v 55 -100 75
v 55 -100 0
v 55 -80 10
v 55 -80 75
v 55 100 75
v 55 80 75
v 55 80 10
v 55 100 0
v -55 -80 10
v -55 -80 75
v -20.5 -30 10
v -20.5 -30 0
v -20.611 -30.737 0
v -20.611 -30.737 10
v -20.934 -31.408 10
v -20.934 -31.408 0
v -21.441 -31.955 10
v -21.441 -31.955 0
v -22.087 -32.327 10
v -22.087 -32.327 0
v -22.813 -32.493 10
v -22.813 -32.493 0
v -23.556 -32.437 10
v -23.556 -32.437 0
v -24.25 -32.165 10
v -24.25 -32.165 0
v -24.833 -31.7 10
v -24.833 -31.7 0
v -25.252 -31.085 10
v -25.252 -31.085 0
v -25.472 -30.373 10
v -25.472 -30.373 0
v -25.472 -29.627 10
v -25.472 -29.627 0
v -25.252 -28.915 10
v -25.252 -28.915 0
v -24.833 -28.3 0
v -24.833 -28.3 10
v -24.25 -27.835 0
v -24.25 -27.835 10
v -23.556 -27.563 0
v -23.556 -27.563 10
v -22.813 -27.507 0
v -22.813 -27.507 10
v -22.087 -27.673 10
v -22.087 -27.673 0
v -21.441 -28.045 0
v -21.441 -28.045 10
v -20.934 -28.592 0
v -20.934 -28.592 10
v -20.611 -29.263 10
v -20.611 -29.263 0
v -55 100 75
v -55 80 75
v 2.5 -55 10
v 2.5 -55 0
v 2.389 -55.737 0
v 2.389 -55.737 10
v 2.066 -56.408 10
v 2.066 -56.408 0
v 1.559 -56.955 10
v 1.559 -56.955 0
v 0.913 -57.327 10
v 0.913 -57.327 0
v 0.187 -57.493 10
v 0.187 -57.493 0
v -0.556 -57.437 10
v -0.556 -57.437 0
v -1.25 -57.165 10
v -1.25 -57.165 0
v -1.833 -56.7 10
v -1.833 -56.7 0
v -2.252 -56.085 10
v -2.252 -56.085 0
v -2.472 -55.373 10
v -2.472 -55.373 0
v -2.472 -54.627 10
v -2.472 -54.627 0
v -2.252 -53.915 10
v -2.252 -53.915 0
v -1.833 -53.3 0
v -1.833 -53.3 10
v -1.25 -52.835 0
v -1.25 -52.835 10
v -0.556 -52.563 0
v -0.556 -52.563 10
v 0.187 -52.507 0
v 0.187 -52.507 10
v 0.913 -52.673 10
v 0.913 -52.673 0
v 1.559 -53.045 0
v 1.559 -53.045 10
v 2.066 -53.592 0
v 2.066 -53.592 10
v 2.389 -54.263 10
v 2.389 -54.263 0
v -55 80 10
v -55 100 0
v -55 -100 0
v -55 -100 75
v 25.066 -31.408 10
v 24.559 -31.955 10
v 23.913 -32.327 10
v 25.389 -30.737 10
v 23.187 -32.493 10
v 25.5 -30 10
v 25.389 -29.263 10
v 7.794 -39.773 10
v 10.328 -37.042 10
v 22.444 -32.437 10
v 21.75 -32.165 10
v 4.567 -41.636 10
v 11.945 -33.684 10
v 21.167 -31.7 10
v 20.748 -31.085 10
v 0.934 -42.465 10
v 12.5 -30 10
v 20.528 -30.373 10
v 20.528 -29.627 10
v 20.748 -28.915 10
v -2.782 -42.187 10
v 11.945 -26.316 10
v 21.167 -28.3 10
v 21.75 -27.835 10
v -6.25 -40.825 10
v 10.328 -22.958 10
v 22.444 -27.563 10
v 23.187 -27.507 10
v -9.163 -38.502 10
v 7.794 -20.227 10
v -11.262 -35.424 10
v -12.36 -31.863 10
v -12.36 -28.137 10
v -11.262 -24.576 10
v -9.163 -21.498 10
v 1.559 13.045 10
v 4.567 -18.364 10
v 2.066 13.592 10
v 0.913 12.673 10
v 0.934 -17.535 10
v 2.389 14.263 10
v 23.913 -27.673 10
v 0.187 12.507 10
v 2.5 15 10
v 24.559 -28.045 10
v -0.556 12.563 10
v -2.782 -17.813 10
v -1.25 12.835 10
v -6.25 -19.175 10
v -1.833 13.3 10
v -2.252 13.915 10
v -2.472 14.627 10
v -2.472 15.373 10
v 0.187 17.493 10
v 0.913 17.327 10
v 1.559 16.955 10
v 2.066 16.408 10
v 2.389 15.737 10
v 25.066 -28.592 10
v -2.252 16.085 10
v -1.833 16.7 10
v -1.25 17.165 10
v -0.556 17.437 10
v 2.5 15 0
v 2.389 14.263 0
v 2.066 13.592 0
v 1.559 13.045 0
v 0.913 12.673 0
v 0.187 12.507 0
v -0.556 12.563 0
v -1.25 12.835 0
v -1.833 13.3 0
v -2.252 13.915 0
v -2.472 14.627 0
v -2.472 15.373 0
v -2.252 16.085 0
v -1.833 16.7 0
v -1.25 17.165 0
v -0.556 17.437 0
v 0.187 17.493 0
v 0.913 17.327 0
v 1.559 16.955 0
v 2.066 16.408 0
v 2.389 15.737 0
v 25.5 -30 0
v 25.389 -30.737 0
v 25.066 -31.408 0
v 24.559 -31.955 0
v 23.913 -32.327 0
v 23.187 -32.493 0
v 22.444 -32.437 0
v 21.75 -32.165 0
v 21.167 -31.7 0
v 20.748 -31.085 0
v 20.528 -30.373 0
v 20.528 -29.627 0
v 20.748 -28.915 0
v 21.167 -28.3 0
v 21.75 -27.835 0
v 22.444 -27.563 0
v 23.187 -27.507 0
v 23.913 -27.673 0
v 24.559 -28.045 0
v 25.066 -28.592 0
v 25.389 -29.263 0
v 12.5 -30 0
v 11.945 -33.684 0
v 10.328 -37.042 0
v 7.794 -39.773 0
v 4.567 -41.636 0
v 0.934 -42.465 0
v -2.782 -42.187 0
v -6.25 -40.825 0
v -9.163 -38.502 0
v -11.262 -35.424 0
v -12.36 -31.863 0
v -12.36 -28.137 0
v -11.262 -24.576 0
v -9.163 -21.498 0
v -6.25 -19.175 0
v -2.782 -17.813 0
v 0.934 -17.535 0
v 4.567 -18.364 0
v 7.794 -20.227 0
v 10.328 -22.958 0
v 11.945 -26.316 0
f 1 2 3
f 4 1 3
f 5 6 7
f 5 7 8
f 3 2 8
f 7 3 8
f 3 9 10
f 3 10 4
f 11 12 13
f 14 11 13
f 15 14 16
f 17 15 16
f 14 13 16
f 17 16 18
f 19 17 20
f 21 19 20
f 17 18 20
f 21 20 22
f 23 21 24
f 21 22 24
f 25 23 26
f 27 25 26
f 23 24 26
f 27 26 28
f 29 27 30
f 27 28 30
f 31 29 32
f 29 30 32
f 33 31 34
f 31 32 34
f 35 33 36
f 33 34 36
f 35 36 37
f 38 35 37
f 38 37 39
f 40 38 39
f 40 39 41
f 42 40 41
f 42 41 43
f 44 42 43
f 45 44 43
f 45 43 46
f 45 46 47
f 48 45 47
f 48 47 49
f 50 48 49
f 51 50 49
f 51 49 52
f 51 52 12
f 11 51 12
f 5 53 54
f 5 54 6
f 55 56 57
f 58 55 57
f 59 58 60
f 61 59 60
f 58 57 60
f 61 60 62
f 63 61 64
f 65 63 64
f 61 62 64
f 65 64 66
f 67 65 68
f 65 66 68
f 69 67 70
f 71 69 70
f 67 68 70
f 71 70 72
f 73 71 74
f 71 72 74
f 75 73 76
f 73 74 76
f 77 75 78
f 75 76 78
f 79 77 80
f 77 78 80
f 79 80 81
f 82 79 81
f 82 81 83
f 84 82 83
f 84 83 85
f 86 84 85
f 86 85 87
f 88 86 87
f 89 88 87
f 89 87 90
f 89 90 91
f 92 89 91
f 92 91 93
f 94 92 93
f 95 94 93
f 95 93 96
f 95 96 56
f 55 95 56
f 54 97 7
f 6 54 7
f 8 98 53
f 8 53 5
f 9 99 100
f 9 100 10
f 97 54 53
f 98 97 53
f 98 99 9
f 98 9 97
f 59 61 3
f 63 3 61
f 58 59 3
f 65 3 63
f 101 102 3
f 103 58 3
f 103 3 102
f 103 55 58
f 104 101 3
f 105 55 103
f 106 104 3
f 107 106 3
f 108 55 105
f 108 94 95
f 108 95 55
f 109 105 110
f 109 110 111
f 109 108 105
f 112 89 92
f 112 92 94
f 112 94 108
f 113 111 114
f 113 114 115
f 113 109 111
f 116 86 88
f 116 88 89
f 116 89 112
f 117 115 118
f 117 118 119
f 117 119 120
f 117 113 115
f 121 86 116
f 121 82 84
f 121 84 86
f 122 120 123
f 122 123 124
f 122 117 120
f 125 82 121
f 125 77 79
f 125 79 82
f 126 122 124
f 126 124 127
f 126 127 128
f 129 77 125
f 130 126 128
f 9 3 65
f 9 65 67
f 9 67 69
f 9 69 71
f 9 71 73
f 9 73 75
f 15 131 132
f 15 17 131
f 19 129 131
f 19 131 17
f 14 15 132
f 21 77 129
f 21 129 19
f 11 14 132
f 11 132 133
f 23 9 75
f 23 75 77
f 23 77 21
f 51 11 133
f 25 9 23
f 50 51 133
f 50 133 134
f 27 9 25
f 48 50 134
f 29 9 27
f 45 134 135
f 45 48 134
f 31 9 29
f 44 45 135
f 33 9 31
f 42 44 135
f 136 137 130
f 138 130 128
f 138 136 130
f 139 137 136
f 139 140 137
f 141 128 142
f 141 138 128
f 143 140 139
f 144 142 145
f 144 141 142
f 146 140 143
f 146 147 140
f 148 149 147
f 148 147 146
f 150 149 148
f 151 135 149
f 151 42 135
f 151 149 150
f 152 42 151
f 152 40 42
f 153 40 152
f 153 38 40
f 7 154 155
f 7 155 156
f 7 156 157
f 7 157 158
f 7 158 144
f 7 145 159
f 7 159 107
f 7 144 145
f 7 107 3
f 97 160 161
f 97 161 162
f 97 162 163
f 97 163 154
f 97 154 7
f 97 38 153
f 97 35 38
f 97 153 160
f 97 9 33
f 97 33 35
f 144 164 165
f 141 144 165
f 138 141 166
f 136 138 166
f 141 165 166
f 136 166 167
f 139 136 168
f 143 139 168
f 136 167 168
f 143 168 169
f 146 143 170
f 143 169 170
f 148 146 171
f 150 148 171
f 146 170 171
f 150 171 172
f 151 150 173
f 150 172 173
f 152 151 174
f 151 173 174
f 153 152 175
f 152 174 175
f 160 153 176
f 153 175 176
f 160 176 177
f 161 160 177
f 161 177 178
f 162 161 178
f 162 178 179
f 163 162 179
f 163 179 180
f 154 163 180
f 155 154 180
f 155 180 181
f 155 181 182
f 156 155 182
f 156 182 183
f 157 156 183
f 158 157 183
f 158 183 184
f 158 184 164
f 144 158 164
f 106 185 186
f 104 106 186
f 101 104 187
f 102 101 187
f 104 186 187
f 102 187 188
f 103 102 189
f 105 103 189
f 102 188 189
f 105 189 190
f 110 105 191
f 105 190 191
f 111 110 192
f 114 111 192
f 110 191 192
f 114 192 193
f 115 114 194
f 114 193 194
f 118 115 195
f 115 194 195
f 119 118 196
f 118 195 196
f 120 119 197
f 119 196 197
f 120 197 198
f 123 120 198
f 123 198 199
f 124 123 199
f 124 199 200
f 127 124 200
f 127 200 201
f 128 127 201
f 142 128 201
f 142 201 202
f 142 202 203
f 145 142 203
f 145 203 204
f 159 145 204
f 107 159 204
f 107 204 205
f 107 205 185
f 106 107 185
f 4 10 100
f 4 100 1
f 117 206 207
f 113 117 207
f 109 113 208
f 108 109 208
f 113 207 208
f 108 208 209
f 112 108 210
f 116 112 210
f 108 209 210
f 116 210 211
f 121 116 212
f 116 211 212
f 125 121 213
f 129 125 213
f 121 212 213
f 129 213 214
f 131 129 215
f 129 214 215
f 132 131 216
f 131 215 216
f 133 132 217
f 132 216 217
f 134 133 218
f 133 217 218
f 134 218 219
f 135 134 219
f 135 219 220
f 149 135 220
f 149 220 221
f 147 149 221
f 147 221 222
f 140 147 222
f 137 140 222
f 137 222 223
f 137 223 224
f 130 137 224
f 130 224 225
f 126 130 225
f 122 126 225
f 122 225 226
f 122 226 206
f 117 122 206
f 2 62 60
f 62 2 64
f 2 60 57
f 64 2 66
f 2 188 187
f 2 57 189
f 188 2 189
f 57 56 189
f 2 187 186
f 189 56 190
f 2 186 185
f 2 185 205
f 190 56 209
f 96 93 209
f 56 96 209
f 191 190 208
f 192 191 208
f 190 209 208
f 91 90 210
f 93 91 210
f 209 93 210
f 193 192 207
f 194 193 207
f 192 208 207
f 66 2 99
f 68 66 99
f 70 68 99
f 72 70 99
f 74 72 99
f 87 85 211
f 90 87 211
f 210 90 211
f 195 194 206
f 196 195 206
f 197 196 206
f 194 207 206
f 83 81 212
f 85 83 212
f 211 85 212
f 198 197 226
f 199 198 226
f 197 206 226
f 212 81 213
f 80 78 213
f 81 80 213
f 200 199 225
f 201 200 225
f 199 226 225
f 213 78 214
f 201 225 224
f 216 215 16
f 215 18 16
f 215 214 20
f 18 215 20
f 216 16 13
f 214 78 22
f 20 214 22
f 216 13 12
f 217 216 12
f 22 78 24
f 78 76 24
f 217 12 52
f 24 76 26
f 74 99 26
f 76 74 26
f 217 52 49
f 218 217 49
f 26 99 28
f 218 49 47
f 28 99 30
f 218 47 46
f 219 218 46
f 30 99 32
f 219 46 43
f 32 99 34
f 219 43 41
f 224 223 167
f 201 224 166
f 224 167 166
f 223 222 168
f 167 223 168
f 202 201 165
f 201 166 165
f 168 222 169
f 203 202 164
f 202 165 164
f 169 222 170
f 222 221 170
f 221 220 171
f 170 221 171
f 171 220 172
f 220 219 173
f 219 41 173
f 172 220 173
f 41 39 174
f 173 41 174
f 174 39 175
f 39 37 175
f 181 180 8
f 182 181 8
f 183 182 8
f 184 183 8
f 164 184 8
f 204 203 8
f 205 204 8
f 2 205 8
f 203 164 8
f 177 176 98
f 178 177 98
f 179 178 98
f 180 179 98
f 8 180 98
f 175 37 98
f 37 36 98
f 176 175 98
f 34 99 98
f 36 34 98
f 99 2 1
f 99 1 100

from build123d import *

# Parameters (mm, degrees)
SKETCH1_W           = 200
SKETCH1_H           = 110
BOSS_EXTRUDE1_DEPTH = 10
SKETCH2_W           = 110
SKETCH2_H           = 20
BOSS_EXTRUDE2_DEPTH = 65
SKETCH4_R           = 12.5
CUT_EXTRUDE1_DEPTH  = 76
SKETCH5_R           = 2.5
CUT_EXTRUDE2_DEPTH  = 76
SKETCH3_R           = 2.5
CUT_EXTRUDE3_DEPTH  = 76


with BuildPart() as part:
    # Sketch1 → Boss-Extrude1 (new body)
    with BuildSketch(Plane(origin=(0, 0, 0), x_dir=(0, 1, 0), z_dir=(0, 0, 1))):
        Rectangle(SKETCH1_W, SKETCH1_H)
    extrude(amount=BOSS_EXTRUDE1_DEPTH)

    # Sketch2 → Boss-Extrude2 (add)
    with BuildSketch(Plane.XY.offset(10)):
        with Locations((0, 90)):
            Rectangle(SKETCH2_W, SKETCH2_H)
        with Locations((0, -90)):
            Rectangle(SKETCH2_W, SKETCH2_H)
    extrude(amount=BOSS_EXTRUDE2_DEPTH)

    # Sketch4 → Cut-Extrude1 (cut, through all)
    with BuildSketch(Plane(origin=(0, 0, 0), x_dir=(1, 0, 0), z_dir=(0, 0, -1))):
        with Locations((0, 30)):
            Circle(SKETCH4_R)
    extrude(amount=-CUT_EXTRUDE1_DEPTH, mode=Mode.SUBTRACT)

    # Sketch5 → Cut-Extrude2 (cut, through all)
    with BuildSketch(Plane(origin=(0, 0, 0), x_dir=(1, 0, 0), z_dir=(0, 0, -1))):
        with Locations((23, 30)):
            Circle(SKETCH5_R)
        with Locations((-23, 30)):
            Circle(SKETCH5_R)
    extrude(amount=-CUT_EXTRUDE2_DEPTH, mode=Mode.SUBTRACT)

    # Sketch3 → Cut-Extrude3 (cut, through all)
    with BuildSketch(Plane(origin=(0, 0, 0), x_dir=(1, 0, 0), z_dir=(0, 0, -1))):
        with Locations((0, 55)):
            Circle(SKETCH3_R)
        with Locations((0, -15)):
            Circle(SKETCH3_R)
    extrude(amount=-CUT_EXTRUDE3_DEPTH, mode=Mode.SUBTRACT)


solid = part.part
